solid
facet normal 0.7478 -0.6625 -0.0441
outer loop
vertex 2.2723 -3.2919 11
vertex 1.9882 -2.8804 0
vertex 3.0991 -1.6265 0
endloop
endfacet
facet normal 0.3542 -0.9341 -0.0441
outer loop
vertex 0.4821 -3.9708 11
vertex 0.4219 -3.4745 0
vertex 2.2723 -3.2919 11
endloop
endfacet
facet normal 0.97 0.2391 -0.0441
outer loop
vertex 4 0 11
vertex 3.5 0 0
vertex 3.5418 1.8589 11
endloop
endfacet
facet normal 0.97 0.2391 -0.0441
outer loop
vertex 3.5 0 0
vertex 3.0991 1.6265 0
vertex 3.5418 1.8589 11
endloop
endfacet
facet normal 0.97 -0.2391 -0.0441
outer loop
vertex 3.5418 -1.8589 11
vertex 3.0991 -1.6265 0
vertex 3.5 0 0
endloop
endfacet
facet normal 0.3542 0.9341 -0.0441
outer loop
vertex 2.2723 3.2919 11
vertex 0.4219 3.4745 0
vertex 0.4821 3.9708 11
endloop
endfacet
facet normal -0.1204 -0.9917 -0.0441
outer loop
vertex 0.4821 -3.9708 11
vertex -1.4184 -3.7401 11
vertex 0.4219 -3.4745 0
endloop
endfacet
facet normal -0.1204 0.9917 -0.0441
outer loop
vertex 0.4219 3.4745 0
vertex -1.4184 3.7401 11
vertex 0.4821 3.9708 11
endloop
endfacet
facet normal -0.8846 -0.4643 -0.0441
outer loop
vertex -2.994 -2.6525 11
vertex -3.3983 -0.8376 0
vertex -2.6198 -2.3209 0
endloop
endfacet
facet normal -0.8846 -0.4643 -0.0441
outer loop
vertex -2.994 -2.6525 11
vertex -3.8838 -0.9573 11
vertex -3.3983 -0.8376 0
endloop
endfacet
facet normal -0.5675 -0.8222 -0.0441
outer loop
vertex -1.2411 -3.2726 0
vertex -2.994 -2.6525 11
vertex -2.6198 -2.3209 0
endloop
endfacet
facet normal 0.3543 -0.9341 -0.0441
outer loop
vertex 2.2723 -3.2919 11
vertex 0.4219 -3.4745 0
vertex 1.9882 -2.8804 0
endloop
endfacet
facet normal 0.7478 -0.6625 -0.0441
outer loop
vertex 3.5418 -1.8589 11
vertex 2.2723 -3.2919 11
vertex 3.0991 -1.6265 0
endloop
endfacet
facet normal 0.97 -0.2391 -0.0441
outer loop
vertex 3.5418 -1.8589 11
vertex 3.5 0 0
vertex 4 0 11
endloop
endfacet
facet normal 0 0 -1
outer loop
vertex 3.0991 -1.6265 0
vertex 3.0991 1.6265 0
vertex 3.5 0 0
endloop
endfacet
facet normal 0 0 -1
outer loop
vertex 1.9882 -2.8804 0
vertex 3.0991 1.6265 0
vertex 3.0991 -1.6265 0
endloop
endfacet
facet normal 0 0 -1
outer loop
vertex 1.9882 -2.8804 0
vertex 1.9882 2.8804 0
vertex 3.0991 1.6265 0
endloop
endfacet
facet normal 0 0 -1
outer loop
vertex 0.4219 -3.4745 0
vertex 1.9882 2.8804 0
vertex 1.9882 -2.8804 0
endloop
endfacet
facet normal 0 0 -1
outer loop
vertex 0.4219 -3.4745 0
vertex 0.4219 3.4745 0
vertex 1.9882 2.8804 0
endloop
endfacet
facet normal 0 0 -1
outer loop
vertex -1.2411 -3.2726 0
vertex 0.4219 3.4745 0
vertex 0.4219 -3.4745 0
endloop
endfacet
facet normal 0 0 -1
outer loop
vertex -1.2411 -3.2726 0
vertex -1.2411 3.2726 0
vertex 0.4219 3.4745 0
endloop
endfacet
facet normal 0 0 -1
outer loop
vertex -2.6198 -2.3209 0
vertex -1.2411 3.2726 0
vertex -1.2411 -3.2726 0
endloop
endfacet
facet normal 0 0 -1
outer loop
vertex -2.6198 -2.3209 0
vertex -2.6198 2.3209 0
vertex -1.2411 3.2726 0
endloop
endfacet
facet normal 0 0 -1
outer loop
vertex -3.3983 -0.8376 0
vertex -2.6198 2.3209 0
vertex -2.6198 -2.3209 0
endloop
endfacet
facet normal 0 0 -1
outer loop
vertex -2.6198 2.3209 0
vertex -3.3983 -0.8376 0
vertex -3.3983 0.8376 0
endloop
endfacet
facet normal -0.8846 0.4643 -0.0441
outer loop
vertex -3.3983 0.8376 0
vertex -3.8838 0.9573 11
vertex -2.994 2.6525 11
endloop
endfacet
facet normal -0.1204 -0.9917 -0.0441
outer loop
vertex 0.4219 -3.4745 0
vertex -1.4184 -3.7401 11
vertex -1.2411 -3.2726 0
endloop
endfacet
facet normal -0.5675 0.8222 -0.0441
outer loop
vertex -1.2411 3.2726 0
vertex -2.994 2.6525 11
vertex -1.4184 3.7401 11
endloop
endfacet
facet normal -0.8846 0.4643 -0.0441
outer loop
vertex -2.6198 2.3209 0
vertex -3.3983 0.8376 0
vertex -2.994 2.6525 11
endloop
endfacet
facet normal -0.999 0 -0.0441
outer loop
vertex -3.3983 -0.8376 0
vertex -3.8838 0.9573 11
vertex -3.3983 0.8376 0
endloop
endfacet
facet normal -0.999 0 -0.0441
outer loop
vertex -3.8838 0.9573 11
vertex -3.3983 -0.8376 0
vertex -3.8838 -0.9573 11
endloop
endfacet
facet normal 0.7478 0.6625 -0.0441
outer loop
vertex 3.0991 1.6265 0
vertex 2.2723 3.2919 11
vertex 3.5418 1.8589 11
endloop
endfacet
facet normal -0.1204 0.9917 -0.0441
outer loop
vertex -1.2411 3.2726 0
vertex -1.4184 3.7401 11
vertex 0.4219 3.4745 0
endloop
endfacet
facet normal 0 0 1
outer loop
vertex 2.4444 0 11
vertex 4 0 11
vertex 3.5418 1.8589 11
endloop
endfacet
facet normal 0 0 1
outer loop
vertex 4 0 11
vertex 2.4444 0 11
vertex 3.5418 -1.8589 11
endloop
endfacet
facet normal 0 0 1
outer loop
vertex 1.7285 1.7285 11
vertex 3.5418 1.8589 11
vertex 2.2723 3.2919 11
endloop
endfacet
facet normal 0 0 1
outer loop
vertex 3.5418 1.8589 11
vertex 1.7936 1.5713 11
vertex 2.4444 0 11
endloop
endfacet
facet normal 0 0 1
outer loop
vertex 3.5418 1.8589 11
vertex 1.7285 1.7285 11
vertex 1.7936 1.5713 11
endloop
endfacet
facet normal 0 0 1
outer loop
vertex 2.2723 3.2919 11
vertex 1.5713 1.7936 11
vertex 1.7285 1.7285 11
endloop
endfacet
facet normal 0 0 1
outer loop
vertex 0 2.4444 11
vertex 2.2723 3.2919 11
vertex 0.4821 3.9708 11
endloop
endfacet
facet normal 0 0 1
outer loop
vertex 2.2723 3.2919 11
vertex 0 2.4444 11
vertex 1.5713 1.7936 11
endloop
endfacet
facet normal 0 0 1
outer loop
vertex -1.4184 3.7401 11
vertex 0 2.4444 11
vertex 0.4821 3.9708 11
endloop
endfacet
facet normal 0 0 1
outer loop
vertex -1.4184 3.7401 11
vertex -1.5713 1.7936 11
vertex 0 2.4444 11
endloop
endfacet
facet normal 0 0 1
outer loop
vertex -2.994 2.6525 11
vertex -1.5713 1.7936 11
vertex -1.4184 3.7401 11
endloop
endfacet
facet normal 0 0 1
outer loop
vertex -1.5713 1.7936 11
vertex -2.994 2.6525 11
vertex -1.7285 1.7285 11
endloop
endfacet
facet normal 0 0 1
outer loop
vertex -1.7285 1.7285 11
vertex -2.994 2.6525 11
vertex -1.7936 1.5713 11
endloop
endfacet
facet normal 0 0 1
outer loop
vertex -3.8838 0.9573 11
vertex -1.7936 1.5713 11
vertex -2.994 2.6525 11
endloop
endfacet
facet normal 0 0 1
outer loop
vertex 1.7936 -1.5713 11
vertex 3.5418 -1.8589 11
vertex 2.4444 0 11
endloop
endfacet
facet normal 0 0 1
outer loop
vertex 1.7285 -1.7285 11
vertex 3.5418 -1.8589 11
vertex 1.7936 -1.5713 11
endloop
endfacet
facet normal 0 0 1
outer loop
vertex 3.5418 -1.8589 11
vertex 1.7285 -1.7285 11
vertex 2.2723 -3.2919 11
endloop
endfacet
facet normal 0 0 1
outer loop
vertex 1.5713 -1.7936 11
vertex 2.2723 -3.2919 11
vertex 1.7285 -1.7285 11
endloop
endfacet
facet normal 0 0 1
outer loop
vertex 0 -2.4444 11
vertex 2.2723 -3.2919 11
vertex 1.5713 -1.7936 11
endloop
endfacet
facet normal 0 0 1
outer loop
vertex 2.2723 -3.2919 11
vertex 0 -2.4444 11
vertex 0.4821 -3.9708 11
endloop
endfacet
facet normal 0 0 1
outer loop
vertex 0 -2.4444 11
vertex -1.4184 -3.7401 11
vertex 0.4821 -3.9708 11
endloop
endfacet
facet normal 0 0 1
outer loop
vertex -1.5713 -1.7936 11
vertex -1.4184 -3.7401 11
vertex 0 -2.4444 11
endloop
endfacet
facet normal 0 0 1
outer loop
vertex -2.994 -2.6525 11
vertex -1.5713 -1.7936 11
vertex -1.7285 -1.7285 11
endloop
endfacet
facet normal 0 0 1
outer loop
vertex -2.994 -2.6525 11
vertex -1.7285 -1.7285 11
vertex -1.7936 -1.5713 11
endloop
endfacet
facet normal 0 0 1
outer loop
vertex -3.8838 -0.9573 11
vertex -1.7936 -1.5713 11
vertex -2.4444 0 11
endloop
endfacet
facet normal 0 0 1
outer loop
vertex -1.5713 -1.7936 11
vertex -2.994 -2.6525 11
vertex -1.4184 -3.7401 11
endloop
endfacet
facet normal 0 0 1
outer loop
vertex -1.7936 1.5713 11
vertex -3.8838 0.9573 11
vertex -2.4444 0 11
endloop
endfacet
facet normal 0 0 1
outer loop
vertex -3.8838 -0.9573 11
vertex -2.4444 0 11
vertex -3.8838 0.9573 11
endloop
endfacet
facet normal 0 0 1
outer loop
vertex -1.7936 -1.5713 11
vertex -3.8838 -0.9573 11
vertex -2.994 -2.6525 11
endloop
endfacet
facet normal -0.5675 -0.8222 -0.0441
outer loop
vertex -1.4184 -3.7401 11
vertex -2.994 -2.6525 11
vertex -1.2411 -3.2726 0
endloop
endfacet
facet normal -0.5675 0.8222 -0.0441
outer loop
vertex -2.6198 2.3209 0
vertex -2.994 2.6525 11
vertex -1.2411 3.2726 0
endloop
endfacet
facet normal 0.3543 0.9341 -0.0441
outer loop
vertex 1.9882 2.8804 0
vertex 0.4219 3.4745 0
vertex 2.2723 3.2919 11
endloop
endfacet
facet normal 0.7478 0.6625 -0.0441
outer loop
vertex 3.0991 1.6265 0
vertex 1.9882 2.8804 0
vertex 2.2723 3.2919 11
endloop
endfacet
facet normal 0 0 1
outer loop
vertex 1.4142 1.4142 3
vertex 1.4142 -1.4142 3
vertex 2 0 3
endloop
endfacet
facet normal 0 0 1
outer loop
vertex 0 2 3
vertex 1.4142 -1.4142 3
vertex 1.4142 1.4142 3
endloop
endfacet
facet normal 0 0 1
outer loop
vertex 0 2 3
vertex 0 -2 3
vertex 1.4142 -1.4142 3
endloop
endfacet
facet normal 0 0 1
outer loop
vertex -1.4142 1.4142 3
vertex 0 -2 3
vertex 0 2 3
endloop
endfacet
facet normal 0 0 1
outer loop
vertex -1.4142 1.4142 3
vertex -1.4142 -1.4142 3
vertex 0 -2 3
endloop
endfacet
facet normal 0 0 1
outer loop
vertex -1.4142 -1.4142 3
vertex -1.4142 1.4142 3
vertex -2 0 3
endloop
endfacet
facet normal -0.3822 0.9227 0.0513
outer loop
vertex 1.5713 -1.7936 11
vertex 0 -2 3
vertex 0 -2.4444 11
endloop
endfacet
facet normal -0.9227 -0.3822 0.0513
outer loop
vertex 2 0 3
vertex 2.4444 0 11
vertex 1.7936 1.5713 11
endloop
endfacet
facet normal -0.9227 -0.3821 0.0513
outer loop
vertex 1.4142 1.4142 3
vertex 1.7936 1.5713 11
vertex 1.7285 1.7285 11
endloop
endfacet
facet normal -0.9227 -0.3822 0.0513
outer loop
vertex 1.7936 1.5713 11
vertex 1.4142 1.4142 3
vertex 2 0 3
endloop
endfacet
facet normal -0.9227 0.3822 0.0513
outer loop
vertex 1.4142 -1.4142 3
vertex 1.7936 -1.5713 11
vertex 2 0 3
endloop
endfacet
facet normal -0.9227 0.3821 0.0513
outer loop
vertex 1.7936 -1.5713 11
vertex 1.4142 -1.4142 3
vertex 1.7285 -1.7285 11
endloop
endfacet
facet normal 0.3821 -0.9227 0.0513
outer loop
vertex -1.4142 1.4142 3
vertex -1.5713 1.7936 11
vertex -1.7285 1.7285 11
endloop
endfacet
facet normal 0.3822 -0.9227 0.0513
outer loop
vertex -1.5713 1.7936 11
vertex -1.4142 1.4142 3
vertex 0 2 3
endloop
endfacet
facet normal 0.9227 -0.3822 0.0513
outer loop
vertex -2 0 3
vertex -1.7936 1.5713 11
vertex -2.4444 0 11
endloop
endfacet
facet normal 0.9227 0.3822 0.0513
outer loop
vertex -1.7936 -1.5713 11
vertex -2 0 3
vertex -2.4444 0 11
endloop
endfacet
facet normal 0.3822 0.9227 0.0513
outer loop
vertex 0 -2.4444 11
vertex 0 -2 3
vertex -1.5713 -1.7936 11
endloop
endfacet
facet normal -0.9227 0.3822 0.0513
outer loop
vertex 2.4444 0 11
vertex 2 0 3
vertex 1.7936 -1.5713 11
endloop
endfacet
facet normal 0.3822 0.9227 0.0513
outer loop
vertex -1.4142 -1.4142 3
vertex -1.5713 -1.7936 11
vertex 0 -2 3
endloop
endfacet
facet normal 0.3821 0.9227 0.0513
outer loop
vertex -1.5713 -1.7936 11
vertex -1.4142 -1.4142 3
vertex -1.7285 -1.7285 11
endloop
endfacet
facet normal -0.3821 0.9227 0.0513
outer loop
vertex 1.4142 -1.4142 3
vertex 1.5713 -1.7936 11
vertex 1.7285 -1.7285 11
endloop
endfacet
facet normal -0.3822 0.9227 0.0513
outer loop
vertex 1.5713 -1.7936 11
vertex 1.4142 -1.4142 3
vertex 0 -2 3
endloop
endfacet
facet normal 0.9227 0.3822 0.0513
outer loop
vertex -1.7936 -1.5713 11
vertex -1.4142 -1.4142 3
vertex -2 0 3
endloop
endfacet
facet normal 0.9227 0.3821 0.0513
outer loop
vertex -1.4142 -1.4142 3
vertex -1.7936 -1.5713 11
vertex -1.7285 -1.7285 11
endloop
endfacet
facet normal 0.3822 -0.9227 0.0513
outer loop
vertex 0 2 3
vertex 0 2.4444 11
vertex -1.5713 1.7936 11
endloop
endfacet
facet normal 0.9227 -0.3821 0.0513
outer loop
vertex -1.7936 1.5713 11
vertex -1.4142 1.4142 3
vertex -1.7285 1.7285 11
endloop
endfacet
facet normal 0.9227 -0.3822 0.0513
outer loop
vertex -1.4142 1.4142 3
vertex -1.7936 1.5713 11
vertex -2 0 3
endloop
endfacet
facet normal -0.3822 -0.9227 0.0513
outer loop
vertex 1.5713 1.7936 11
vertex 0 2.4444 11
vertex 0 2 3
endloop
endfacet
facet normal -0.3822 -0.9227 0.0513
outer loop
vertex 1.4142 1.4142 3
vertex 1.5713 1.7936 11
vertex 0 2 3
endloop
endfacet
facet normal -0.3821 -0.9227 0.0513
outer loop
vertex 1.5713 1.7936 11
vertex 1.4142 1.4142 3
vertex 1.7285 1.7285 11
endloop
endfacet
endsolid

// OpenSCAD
// file: cap.scad
/*
    Simple cap.
    
    Print Notes
        Use a rubbery plastic. The type I have sometimes is dodgy on the first layer.
        Using  brim may help.
*/

module cap( d1, d2, h, thickness )
{
    difference() {
        cylinder( d1=d1+thickness, d2=d2 + thickness, h=h+thickness );
        translate( [0,0,thickness] ) {
            cylinder( d1=d1, d2=d2, h=h+1 );
        }
    }
}
// main file
/*
    A cap to fit on the end of a measuring syringe, used to measure out medicine. The cap is useful, because you can
    measure the dose at home, and take the syringe with you. No need to carry a big bottle.
    
    Print Notes
        Print with a rubbery plastic.
*/
use <cap.scad>;

cap( 4, 5,  8,  3 );
